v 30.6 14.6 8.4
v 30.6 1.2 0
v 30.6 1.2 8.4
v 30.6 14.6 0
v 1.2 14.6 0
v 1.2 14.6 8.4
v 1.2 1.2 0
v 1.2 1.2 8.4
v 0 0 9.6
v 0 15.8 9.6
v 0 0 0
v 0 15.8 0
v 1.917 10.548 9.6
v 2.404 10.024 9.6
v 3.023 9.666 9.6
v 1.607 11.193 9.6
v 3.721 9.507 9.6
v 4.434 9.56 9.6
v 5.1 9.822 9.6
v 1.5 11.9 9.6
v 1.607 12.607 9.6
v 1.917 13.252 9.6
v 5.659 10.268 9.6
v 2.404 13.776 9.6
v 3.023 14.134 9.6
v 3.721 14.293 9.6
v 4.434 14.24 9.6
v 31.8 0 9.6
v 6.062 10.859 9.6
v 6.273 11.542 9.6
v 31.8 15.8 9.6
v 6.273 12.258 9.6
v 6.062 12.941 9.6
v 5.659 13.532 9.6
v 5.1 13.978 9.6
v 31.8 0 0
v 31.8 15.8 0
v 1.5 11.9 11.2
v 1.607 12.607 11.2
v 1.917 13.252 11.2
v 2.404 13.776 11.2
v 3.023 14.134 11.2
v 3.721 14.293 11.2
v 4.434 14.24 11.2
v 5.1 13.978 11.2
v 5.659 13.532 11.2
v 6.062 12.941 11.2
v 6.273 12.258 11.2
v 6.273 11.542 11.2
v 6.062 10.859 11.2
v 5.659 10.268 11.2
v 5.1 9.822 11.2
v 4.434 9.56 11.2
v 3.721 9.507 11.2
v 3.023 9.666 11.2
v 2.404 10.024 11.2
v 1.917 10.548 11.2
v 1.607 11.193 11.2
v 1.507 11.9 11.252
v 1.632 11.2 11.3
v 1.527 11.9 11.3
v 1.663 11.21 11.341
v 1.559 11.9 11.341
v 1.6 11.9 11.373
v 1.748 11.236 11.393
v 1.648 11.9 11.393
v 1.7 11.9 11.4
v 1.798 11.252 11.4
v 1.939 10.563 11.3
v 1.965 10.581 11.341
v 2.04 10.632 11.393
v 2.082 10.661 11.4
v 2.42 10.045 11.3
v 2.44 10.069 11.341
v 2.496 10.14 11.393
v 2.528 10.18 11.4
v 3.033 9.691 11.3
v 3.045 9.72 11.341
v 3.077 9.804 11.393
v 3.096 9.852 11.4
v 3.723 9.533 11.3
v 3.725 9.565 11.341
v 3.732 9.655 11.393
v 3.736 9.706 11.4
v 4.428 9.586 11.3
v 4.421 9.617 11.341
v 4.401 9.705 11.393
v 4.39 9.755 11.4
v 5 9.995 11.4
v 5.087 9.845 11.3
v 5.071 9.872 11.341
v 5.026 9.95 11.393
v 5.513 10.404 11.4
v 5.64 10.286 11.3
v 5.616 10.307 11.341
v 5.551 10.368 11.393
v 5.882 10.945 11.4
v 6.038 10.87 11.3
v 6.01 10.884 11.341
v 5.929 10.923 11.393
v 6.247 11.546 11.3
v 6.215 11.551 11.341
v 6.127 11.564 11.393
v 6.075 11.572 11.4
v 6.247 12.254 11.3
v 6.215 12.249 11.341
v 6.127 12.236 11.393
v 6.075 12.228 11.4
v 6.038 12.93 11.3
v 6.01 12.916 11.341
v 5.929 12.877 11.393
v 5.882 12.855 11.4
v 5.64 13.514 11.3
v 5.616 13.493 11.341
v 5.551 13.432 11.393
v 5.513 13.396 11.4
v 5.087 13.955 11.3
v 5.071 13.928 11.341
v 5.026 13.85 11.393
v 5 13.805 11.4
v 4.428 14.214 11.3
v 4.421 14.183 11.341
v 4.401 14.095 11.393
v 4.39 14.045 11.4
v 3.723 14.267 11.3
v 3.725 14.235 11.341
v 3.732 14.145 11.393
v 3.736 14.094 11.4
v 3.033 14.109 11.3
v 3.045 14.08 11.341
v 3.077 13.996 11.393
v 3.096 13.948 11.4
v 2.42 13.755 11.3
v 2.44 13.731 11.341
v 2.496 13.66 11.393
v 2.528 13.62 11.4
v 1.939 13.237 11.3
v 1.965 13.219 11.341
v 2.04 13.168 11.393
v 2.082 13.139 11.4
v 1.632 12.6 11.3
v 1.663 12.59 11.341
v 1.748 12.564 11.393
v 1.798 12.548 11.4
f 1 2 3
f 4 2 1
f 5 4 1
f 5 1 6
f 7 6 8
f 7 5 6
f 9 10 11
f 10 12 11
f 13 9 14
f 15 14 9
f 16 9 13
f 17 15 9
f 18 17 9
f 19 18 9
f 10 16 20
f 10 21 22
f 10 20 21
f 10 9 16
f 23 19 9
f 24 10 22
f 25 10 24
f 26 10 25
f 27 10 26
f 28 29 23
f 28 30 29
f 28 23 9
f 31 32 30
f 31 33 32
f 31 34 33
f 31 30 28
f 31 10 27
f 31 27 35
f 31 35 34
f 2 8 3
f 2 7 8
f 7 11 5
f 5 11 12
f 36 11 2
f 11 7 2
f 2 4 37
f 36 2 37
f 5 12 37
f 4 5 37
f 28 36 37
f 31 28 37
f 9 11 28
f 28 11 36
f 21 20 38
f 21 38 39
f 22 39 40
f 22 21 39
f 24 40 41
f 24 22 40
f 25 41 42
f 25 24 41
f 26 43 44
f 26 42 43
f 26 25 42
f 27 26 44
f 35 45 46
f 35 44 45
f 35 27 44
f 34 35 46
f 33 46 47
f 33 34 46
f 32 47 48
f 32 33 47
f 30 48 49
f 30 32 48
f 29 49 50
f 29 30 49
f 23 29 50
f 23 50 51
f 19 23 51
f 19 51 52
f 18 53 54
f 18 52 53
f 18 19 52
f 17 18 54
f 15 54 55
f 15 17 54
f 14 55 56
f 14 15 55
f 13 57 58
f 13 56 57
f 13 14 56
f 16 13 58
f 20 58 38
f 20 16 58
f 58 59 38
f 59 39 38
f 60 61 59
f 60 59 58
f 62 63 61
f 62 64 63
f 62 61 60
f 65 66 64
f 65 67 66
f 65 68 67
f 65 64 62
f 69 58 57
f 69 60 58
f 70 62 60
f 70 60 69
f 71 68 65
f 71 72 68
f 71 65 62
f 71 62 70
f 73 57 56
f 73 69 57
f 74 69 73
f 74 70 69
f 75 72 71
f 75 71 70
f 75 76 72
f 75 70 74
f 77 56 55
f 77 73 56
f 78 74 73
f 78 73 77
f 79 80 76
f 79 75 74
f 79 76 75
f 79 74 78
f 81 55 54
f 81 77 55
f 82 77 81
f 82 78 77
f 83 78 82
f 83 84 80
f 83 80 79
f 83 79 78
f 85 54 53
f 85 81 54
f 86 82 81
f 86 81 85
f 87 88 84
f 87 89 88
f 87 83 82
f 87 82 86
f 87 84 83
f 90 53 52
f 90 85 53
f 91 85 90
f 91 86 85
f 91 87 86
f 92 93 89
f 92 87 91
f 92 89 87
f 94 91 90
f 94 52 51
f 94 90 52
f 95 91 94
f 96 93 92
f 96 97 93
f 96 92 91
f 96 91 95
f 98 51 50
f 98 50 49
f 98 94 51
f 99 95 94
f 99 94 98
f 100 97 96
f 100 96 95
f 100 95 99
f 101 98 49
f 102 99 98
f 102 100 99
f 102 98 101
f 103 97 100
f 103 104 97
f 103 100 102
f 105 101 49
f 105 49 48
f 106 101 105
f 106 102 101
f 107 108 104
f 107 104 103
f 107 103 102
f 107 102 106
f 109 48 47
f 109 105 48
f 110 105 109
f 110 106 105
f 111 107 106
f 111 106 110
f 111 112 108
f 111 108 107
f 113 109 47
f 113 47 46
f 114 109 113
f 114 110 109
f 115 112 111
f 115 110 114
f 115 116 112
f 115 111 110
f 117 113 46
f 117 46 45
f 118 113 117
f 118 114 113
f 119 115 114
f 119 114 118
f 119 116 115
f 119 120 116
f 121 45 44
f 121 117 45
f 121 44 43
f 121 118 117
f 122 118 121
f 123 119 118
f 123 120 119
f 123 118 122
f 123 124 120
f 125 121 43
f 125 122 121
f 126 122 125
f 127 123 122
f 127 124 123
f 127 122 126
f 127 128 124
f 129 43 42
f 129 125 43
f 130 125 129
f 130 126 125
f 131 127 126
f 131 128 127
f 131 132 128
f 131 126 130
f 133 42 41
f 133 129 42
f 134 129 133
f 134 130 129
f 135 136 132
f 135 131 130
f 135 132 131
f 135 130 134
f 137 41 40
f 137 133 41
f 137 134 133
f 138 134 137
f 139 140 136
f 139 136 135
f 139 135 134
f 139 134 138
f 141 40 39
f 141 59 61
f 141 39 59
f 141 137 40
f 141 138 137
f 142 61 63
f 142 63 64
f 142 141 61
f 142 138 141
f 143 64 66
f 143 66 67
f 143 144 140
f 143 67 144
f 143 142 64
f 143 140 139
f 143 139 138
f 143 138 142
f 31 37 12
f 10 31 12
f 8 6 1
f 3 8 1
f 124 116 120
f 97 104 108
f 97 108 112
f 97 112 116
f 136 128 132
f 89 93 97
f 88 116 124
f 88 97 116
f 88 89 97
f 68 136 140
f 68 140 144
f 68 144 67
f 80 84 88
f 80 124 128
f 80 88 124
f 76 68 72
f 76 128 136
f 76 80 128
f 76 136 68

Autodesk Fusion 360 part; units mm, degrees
sketch "Sketch1" plane through (0, 0, 0) normal (0, 0, 1) x (1, 0, 0)
  line L0 (0, 0) -> (31.8, 0)
  line L1 (31.8, 0) -> (31.8, 15.8)
  line L2 (31.8, 15.8) -> (0, 15.8)
  line L3 (0, 15.8) -> (0, 0)
  dimension "d3" = 31.8
  dimension "d4" = 15.8
extrude "Extrude1" add sketch "Sketch1" along normal blind 9.6
shell "Shell1" thickness 1.2 removed faces 1 at (21.2, 5.2667, 0)
sketch "Sketch2" plane through (0, 0, 9.6) normal (0, 0, 1) x (-1, 0, 0)
  line L0 (0, -15.8) -> (0, 0)
  line L1 (0, 0) -> (-31.8, 0)
  line L2 (-31.8, 0) -> (-31.8, -15.8)
  line L3 (-31.8, -15.8) -> (0, -15.8)
  circle A0 centre (-3.9, -11.9) radius 2.4
  dimension "d8" = 4.8
  dimension "d9" = 3.9
  dimension "d10" = 3.9
extrude "Extrude2" add sketch "Sketch2" along normal blind 1.8 contours A0
fillet "Fillet1" radius 0.2 1 edges at (6.1376, 12.7679, 11.4)
equation "d3 = ( 3.9 * 2 ) * 1 mm + ( 8.0 * ( n_orizzontale - 1 ) ) * 1 mm"
equation "d4 = ( 3.9 * 2 ) * 1 mm + ( 8.0 * ( n_verticale - 1 ) ) * 1 mm"
equation "d15 = n_orizzontale"
equation "d16 = n_verticale"
equation "n_orizzontale = 4"
equation "n_verticale = 2"
